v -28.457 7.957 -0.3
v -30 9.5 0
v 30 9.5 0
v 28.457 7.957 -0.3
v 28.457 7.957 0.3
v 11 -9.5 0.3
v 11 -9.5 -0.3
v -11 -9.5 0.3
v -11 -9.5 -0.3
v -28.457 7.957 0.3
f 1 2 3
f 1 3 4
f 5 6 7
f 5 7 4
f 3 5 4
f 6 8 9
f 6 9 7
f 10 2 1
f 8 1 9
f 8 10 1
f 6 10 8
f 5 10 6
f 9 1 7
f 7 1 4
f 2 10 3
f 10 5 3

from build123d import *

# Parameters (mm, degrees)
F1_DEPTH = 0.3
F3_DEPTH = 30


with BuildPart() as f1:
    # F0 (on Top) → F1 (new body, symmetric)
    with BuildSketch(Plane.XY):
        Polygon((30, 9.5), (-30, 9.5), (-11, -9.5), (11, -9.5), align=None)
    extrude(amount=F1_DEPTH, both=True)

    # F2 (on Right) → F3 (cut, symmetric)
    with BuildSketch(Plane.YZ):
        Polygon((9.5, 0), (9.5, 0.3), (7.956634, 0.3), align=None)
        Polygon((9.5, -0.3), (9.5, 0), (7.956634, -0.3), align=None)
    extrude(amount=F3_DEPTH, both=True, mode=Mode.SUBTRACT)


solid = f1.part
